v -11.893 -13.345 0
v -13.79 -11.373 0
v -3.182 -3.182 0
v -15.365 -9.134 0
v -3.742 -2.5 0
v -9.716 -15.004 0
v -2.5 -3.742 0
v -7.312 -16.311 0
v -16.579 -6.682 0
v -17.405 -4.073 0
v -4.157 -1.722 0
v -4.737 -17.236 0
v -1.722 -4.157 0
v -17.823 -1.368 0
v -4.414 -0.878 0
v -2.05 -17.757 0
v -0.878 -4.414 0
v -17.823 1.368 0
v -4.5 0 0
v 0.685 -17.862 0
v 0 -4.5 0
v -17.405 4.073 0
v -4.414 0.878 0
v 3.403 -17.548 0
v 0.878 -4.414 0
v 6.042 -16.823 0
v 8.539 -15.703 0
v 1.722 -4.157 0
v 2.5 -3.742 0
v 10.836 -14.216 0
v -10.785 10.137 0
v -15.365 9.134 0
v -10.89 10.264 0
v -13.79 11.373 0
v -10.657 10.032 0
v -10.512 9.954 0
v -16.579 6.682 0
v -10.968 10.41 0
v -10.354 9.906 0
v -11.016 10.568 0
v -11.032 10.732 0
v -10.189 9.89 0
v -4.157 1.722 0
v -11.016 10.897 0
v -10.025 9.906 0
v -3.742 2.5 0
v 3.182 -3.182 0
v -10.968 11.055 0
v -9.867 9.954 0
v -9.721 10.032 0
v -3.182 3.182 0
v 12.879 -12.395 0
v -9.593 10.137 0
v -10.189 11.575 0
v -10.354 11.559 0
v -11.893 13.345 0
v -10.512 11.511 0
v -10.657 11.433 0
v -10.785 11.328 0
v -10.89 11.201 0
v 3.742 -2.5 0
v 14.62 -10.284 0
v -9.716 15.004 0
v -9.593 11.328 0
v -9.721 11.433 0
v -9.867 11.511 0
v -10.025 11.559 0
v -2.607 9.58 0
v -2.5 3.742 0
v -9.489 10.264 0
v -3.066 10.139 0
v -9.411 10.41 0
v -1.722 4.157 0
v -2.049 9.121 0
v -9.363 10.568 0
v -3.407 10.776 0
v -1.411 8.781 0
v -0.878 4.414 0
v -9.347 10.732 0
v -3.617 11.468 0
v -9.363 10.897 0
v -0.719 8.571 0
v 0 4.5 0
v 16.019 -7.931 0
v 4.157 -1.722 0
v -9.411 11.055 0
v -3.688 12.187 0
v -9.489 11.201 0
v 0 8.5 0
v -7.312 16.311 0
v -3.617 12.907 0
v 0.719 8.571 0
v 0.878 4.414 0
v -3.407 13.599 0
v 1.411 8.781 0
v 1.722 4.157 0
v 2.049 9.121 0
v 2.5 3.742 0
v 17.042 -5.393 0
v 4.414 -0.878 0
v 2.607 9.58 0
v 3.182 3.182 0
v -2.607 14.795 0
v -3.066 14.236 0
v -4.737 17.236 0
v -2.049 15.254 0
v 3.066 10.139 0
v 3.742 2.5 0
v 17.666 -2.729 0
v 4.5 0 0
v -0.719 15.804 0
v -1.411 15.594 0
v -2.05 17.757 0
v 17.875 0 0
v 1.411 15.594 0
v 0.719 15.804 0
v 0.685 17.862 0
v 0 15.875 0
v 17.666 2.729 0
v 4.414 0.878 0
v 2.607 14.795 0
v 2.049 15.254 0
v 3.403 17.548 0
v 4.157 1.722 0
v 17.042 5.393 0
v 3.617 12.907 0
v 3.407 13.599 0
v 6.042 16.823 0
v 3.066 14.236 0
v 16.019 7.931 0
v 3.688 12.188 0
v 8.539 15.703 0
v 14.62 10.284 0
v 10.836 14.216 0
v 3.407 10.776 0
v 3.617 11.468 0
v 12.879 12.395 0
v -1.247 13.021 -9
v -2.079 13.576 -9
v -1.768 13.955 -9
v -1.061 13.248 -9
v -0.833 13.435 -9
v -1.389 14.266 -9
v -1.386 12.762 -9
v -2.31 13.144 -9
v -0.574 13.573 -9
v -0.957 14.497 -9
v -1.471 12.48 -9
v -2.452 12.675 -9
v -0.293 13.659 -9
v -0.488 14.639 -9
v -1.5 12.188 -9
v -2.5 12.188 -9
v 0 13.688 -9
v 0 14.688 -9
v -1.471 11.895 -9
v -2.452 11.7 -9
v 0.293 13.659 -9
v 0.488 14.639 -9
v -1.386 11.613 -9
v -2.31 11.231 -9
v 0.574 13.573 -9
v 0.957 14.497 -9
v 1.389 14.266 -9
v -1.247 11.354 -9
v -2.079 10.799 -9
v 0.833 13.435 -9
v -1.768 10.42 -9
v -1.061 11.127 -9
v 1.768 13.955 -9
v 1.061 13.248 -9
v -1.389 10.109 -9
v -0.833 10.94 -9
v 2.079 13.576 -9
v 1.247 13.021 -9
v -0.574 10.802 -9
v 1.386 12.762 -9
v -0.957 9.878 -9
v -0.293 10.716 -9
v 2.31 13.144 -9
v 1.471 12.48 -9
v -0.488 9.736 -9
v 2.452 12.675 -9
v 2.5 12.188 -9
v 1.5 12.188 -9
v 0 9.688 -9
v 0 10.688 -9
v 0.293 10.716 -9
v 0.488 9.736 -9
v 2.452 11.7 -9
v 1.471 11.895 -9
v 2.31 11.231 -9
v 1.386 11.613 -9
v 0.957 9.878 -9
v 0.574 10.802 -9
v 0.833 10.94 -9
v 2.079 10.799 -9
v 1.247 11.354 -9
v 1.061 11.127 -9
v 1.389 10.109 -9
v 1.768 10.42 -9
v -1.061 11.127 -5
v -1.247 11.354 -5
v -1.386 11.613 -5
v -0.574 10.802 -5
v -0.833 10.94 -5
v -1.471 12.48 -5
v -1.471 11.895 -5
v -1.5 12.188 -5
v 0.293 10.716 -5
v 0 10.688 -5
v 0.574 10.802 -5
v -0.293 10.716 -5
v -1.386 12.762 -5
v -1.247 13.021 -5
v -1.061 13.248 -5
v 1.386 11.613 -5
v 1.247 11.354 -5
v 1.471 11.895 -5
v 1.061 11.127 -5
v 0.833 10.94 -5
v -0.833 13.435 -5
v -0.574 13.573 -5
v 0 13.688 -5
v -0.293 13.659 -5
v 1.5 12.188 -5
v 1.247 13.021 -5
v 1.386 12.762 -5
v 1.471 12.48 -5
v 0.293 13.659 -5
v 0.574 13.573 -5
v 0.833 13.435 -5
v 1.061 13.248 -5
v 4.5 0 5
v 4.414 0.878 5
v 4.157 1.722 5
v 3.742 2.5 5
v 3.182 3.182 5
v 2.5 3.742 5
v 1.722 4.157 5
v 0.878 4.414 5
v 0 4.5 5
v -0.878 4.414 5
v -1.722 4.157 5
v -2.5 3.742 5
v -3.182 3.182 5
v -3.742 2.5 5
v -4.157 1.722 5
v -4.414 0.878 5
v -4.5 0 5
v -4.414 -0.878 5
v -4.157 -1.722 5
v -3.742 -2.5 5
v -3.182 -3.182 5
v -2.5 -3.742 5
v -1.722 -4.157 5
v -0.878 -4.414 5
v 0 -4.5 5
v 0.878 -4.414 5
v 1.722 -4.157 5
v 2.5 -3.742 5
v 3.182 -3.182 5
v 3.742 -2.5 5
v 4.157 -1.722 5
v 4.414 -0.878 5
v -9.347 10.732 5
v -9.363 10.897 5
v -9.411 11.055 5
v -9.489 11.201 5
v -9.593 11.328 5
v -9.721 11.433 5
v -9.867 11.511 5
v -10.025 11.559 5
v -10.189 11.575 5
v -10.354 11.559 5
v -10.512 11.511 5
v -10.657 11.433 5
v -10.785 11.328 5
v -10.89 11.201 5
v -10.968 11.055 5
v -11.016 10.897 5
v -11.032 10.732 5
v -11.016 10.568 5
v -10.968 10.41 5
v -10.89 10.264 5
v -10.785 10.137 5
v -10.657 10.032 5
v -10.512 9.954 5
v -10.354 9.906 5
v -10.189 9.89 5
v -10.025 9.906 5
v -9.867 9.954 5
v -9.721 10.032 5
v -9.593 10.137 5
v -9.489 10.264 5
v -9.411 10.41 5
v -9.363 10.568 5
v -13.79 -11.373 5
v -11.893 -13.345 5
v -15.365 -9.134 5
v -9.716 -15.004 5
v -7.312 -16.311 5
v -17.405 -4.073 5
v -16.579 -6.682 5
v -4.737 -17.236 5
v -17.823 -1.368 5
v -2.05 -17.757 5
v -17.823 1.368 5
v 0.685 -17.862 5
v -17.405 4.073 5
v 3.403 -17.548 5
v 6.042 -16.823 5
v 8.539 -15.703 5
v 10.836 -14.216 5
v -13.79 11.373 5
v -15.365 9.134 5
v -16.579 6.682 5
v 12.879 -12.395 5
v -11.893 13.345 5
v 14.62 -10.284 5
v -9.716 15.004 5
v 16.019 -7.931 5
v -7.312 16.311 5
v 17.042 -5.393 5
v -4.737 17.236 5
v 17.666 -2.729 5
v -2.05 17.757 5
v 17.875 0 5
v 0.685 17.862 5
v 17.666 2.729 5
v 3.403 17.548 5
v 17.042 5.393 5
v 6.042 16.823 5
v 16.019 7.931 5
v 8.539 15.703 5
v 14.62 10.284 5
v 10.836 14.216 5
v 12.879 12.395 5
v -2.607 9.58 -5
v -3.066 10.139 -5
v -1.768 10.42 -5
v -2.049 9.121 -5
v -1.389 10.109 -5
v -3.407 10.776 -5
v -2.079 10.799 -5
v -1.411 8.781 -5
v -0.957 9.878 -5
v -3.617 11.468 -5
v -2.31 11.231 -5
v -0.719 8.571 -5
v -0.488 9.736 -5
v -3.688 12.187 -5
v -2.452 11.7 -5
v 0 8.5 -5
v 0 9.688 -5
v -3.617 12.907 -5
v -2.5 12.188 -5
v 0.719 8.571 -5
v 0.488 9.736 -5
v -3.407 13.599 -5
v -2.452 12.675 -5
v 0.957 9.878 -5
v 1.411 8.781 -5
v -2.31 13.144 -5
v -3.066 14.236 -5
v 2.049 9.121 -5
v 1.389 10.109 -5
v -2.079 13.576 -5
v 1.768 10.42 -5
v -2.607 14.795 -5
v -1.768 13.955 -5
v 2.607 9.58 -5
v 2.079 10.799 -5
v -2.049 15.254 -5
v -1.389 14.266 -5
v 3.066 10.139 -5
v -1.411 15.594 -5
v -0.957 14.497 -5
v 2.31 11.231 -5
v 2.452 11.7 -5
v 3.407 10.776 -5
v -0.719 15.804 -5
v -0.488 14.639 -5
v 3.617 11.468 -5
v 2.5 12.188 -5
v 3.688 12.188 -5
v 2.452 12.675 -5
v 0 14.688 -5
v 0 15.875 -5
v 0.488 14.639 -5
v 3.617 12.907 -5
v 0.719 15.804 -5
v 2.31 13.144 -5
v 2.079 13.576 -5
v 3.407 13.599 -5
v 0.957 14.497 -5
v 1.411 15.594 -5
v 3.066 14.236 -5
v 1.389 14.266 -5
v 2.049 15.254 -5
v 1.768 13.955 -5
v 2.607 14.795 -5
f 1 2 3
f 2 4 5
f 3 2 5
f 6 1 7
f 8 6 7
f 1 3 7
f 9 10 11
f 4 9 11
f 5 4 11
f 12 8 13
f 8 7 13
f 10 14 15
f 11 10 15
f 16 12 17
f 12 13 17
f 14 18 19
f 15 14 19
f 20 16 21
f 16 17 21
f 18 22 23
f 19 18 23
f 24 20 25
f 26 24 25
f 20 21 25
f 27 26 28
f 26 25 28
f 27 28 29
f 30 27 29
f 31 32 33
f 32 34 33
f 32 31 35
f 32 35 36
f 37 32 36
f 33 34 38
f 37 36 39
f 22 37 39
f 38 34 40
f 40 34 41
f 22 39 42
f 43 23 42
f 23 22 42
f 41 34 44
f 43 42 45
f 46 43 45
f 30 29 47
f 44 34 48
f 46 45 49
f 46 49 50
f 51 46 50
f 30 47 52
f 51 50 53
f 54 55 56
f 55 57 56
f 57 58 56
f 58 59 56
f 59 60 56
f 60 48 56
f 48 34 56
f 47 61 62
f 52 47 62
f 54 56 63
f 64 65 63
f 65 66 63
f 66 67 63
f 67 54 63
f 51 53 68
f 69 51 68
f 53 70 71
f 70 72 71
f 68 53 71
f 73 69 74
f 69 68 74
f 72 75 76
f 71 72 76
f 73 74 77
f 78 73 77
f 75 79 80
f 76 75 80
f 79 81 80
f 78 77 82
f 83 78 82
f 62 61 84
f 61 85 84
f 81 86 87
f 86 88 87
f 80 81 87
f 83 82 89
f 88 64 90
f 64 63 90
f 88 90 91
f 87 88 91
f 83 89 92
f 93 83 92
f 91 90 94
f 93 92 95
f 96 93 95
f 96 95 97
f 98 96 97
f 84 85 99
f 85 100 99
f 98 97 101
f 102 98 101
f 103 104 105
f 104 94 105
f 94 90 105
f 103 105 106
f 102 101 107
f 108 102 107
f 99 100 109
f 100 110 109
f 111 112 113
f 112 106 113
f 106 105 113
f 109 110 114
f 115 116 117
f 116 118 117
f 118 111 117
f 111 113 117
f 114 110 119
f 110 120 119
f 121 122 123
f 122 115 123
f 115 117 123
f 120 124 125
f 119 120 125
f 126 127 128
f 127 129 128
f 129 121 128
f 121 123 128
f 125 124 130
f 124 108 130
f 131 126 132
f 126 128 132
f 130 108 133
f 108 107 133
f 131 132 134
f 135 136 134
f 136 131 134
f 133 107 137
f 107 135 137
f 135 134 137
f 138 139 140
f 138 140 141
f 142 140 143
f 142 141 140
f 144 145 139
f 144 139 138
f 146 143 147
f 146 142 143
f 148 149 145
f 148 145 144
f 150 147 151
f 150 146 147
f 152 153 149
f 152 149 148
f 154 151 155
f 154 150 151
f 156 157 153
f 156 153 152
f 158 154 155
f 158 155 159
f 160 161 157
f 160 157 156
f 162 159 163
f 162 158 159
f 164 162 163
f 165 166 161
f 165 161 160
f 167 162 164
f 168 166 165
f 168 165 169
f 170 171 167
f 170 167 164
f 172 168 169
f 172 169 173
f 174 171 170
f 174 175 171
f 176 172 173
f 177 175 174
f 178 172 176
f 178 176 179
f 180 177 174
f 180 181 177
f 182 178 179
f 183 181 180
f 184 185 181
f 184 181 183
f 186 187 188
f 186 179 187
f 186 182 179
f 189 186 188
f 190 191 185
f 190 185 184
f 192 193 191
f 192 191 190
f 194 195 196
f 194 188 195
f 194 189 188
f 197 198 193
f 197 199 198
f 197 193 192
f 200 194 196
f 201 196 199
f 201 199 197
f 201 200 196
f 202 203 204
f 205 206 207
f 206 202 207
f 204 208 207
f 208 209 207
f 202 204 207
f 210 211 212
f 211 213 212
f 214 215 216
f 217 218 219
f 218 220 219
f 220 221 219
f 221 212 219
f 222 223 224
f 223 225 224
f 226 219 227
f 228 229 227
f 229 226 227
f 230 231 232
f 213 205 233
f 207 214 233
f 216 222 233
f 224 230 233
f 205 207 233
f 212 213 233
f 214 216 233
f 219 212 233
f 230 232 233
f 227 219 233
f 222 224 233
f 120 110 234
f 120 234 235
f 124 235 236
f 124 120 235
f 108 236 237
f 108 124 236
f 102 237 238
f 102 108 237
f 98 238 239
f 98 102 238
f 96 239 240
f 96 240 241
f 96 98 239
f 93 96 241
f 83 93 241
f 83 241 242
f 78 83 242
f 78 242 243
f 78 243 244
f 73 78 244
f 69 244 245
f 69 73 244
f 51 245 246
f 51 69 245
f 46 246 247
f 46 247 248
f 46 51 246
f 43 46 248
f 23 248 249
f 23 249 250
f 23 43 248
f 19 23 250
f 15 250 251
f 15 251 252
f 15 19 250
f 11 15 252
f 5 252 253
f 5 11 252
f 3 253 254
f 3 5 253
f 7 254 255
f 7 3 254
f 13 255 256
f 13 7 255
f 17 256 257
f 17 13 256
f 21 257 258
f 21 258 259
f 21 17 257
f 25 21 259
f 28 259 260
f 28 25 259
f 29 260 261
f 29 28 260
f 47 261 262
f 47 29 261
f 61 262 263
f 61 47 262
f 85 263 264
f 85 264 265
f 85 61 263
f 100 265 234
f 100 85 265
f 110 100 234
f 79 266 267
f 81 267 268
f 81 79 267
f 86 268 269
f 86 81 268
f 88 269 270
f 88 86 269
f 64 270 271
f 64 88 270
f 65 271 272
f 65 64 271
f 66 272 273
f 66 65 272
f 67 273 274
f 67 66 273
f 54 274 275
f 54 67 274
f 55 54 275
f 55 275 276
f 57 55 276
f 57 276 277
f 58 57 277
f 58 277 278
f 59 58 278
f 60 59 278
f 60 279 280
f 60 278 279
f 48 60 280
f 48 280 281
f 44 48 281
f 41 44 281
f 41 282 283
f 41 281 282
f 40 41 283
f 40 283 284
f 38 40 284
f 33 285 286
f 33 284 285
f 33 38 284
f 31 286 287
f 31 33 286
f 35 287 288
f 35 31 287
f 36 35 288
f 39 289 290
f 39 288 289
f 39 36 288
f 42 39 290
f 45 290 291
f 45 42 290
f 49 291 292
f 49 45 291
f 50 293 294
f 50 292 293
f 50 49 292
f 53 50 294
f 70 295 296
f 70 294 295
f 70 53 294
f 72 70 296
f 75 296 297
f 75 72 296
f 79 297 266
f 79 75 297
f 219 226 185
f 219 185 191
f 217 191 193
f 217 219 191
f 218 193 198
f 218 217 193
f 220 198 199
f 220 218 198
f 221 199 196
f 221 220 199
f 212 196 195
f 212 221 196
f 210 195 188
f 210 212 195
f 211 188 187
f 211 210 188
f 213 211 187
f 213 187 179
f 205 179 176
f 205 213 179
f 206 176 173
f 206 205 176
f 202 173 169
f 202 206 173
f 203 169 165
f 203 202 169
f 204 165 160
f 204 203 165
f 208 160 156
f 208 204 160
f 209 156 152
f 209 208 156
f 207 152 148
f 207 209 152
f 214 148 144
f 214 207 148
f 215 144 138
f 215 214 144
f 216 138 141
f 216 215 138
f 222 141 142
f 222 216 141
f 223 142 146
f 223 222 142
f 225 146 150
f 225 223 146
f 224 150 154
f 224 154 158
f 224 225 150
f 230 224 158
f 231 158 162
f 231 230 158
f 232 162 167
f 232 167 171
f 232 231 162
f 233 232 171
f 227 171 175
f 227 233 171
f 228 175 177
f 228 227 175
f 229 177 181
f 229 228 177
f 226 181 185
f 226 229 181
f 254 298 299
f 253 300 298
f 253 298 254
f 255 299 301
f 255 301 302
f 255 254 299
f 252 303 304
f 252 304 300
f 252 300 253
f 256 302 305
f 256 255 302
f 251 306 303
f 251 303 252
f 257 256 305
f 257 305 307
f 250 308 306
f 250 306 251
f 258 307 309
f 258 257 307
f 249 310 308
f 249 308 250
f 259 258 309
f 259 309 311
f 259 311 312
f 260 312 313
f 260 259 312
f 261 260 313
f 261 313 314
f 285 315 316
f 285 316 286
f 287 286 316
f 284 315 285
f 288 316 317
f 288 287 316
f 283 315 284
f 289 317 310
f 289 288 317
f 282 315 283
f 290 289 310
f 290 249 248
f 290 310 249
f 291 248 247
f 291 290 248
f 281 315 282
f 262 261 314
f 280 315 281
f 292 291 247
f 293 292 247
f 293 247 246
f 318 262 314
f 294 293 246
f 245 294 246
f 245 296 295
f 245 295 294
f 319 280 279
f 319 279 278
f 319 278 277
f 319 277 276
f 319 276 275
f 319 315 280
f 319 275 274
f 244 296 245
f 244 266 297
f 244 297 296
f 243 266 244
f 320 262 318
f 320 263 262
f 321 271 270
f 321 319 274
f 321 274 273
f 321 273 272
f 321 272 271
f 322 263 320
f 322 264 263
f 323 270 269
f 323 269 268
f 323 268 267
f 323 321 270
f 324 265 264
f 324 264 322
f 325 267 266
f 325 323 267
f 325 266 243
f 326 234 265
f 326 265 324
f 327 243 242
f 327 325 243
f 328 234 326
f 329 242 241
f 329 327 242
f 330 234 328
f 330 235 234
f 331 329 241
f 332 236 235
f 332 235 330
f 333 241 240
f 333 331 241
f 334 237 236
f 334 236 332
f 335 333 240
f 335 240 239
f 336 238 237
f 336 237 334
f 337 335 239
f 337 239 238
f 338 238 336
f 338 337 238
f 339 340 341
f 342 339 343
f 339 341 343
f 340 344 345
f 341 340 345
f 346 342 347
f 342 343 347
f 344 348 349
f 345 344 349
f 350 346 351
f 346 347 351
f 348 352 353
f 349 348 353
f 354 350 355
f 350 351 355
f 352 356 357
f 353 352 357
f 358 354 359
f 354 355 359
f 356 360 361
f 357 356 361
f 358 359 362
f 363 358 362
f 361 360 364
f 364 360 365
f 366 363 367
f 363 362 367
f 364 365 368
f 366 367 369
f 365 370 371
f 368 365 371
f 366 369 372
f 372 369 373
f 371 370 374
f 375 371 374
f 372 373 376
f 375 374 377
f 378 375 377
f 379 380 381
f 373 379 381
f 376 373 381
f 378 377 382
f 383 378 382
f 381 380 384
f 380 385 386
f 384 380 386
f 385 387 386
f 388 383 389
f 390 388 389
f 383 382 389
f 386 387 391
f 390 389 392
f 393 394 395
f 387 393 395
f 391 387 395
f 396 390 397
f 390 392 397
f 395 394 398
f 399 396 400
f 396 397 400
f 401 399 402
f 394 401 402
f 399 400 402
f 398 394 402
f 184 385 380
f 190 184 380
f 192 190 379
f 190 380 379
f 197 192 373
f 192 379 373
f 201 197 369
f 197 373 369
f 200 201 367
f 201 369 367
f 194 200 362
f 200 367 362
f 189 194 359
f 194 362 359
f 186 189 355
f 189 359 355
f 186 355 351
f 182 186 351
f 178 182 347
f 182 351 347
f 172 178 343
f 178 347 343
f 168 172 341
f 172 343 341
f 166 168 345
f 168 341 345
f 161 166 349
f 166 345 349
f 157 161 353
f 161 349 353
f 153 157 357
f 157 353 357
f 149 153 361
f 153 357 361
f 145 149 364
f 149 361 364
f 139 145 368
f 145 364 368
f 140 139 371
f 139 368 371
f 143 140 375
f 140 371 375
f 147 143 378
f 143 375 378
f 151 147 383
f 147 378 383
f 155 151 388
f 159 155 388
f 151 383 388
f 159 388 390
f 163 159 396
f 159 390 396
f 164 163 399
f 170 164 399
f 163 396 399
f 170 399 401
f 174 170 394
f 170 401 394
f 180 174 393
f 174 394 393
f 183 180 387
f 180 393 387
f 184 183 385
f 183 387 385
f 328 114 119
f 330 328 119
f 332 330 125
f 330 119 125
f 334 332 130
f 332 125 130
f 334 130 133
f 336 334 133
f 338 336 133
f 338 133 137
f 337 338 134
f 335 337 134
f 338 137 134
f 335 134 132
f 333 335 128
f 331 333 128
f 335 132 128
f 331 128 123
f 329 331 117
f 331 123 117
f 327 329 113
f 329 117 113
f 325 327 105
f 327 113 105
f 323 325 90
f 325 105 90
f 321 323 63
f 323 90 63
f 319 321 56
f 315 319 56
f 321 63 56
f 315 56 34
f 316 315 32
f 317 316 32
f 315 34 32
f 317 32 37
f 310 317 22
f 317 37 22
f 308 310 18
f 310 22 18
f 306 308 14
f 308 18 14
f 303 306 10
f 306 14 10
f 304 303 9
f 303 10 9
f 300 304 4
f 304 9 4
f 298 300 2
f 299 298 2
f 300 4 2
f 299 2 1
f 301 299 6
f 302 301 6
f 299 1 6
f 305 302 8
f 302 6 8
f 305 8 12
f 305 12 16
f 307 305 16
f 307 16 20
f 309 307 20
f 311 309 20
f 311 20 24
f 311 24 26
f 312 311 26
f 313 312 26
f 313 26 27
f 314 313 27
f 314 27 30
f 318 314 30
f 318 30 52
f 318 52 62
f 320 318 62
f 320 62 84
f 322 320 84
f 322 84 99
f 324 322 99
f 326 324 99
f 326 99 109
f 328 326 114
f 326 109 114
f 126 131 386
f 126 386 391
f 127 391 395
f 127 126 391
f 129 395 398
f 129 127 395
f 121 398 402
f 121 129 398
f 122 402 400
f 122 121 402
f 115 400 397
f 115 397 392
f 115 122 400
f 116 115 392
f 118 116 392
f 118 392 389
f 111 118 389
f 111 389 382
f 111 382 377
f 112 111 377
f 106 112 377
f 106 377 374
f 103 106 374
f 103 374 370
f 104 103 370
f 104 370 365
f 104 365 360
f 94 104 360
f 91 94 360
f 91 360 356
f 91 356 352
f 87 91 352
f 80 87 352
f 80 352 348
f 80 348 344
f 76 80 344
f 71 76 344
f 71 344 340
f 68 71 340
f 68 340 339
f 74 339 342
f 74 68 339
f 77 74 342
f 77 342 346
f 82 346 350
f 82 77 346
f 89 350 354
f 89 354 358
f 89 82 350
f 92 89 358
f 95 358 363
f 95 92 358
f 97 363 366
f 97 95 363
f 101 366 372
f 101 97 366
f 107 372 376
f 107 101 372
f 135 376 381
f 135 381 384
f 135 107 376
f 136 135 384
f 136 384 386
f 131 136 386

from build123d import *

# Parameters (mm, degrees)
F0_R     = 17.875
F0_R_2   = 4.5
F1_DEPTH = 5
F2_R     = 3.6875
F3_DEPTH = 10
F4_R     = 2.5
F4_R_2   = 1.5
F5_DEPTH = 4
F6_R     = 0.842662
F7_DEPTH = 25


with BuildPart() as f1:
    # F0 (on Top) → F1 (new body)
    with BuildSketch(Plane.XY):
        Circle(F0_R)
        Circle(F0_R_2, mode=Mode.SUBTRACT)
    extrude(amount=F1_DEPTH)

    # F2 (on face) → F3 (join)
    with BuildSketch(Plane.XY.offset(5)):
        with Locations((0, 12.1875)):
            Circle(F2_R)
    extrude(amount=-F3_DEPTH)

    # F4 (on face) → F5 (join)
    with BuildSketch(Plane(origin=(0, 0, -5), x_dir=(1, 0, 0), z_dir=(0, 0, -1))):
        with Locations((0, -12.1875)):
            Circle(F4_R)
        with Locations((0, -12.1875)):
            Circle(F4_R_2, mode=Mode.SUBTRACT)
    extrude(amount=F5_DEPTH)

    # F6 (on Top) → F7 (cut)
    with BuildSketch(Plane.XY):
        with Locations((-10.189319, 10.732485)):
            Circle(F6_R)
    extrude(amount=F7_DEPTH, mode=Mode.SUBTRACT)


solid = f1.part
